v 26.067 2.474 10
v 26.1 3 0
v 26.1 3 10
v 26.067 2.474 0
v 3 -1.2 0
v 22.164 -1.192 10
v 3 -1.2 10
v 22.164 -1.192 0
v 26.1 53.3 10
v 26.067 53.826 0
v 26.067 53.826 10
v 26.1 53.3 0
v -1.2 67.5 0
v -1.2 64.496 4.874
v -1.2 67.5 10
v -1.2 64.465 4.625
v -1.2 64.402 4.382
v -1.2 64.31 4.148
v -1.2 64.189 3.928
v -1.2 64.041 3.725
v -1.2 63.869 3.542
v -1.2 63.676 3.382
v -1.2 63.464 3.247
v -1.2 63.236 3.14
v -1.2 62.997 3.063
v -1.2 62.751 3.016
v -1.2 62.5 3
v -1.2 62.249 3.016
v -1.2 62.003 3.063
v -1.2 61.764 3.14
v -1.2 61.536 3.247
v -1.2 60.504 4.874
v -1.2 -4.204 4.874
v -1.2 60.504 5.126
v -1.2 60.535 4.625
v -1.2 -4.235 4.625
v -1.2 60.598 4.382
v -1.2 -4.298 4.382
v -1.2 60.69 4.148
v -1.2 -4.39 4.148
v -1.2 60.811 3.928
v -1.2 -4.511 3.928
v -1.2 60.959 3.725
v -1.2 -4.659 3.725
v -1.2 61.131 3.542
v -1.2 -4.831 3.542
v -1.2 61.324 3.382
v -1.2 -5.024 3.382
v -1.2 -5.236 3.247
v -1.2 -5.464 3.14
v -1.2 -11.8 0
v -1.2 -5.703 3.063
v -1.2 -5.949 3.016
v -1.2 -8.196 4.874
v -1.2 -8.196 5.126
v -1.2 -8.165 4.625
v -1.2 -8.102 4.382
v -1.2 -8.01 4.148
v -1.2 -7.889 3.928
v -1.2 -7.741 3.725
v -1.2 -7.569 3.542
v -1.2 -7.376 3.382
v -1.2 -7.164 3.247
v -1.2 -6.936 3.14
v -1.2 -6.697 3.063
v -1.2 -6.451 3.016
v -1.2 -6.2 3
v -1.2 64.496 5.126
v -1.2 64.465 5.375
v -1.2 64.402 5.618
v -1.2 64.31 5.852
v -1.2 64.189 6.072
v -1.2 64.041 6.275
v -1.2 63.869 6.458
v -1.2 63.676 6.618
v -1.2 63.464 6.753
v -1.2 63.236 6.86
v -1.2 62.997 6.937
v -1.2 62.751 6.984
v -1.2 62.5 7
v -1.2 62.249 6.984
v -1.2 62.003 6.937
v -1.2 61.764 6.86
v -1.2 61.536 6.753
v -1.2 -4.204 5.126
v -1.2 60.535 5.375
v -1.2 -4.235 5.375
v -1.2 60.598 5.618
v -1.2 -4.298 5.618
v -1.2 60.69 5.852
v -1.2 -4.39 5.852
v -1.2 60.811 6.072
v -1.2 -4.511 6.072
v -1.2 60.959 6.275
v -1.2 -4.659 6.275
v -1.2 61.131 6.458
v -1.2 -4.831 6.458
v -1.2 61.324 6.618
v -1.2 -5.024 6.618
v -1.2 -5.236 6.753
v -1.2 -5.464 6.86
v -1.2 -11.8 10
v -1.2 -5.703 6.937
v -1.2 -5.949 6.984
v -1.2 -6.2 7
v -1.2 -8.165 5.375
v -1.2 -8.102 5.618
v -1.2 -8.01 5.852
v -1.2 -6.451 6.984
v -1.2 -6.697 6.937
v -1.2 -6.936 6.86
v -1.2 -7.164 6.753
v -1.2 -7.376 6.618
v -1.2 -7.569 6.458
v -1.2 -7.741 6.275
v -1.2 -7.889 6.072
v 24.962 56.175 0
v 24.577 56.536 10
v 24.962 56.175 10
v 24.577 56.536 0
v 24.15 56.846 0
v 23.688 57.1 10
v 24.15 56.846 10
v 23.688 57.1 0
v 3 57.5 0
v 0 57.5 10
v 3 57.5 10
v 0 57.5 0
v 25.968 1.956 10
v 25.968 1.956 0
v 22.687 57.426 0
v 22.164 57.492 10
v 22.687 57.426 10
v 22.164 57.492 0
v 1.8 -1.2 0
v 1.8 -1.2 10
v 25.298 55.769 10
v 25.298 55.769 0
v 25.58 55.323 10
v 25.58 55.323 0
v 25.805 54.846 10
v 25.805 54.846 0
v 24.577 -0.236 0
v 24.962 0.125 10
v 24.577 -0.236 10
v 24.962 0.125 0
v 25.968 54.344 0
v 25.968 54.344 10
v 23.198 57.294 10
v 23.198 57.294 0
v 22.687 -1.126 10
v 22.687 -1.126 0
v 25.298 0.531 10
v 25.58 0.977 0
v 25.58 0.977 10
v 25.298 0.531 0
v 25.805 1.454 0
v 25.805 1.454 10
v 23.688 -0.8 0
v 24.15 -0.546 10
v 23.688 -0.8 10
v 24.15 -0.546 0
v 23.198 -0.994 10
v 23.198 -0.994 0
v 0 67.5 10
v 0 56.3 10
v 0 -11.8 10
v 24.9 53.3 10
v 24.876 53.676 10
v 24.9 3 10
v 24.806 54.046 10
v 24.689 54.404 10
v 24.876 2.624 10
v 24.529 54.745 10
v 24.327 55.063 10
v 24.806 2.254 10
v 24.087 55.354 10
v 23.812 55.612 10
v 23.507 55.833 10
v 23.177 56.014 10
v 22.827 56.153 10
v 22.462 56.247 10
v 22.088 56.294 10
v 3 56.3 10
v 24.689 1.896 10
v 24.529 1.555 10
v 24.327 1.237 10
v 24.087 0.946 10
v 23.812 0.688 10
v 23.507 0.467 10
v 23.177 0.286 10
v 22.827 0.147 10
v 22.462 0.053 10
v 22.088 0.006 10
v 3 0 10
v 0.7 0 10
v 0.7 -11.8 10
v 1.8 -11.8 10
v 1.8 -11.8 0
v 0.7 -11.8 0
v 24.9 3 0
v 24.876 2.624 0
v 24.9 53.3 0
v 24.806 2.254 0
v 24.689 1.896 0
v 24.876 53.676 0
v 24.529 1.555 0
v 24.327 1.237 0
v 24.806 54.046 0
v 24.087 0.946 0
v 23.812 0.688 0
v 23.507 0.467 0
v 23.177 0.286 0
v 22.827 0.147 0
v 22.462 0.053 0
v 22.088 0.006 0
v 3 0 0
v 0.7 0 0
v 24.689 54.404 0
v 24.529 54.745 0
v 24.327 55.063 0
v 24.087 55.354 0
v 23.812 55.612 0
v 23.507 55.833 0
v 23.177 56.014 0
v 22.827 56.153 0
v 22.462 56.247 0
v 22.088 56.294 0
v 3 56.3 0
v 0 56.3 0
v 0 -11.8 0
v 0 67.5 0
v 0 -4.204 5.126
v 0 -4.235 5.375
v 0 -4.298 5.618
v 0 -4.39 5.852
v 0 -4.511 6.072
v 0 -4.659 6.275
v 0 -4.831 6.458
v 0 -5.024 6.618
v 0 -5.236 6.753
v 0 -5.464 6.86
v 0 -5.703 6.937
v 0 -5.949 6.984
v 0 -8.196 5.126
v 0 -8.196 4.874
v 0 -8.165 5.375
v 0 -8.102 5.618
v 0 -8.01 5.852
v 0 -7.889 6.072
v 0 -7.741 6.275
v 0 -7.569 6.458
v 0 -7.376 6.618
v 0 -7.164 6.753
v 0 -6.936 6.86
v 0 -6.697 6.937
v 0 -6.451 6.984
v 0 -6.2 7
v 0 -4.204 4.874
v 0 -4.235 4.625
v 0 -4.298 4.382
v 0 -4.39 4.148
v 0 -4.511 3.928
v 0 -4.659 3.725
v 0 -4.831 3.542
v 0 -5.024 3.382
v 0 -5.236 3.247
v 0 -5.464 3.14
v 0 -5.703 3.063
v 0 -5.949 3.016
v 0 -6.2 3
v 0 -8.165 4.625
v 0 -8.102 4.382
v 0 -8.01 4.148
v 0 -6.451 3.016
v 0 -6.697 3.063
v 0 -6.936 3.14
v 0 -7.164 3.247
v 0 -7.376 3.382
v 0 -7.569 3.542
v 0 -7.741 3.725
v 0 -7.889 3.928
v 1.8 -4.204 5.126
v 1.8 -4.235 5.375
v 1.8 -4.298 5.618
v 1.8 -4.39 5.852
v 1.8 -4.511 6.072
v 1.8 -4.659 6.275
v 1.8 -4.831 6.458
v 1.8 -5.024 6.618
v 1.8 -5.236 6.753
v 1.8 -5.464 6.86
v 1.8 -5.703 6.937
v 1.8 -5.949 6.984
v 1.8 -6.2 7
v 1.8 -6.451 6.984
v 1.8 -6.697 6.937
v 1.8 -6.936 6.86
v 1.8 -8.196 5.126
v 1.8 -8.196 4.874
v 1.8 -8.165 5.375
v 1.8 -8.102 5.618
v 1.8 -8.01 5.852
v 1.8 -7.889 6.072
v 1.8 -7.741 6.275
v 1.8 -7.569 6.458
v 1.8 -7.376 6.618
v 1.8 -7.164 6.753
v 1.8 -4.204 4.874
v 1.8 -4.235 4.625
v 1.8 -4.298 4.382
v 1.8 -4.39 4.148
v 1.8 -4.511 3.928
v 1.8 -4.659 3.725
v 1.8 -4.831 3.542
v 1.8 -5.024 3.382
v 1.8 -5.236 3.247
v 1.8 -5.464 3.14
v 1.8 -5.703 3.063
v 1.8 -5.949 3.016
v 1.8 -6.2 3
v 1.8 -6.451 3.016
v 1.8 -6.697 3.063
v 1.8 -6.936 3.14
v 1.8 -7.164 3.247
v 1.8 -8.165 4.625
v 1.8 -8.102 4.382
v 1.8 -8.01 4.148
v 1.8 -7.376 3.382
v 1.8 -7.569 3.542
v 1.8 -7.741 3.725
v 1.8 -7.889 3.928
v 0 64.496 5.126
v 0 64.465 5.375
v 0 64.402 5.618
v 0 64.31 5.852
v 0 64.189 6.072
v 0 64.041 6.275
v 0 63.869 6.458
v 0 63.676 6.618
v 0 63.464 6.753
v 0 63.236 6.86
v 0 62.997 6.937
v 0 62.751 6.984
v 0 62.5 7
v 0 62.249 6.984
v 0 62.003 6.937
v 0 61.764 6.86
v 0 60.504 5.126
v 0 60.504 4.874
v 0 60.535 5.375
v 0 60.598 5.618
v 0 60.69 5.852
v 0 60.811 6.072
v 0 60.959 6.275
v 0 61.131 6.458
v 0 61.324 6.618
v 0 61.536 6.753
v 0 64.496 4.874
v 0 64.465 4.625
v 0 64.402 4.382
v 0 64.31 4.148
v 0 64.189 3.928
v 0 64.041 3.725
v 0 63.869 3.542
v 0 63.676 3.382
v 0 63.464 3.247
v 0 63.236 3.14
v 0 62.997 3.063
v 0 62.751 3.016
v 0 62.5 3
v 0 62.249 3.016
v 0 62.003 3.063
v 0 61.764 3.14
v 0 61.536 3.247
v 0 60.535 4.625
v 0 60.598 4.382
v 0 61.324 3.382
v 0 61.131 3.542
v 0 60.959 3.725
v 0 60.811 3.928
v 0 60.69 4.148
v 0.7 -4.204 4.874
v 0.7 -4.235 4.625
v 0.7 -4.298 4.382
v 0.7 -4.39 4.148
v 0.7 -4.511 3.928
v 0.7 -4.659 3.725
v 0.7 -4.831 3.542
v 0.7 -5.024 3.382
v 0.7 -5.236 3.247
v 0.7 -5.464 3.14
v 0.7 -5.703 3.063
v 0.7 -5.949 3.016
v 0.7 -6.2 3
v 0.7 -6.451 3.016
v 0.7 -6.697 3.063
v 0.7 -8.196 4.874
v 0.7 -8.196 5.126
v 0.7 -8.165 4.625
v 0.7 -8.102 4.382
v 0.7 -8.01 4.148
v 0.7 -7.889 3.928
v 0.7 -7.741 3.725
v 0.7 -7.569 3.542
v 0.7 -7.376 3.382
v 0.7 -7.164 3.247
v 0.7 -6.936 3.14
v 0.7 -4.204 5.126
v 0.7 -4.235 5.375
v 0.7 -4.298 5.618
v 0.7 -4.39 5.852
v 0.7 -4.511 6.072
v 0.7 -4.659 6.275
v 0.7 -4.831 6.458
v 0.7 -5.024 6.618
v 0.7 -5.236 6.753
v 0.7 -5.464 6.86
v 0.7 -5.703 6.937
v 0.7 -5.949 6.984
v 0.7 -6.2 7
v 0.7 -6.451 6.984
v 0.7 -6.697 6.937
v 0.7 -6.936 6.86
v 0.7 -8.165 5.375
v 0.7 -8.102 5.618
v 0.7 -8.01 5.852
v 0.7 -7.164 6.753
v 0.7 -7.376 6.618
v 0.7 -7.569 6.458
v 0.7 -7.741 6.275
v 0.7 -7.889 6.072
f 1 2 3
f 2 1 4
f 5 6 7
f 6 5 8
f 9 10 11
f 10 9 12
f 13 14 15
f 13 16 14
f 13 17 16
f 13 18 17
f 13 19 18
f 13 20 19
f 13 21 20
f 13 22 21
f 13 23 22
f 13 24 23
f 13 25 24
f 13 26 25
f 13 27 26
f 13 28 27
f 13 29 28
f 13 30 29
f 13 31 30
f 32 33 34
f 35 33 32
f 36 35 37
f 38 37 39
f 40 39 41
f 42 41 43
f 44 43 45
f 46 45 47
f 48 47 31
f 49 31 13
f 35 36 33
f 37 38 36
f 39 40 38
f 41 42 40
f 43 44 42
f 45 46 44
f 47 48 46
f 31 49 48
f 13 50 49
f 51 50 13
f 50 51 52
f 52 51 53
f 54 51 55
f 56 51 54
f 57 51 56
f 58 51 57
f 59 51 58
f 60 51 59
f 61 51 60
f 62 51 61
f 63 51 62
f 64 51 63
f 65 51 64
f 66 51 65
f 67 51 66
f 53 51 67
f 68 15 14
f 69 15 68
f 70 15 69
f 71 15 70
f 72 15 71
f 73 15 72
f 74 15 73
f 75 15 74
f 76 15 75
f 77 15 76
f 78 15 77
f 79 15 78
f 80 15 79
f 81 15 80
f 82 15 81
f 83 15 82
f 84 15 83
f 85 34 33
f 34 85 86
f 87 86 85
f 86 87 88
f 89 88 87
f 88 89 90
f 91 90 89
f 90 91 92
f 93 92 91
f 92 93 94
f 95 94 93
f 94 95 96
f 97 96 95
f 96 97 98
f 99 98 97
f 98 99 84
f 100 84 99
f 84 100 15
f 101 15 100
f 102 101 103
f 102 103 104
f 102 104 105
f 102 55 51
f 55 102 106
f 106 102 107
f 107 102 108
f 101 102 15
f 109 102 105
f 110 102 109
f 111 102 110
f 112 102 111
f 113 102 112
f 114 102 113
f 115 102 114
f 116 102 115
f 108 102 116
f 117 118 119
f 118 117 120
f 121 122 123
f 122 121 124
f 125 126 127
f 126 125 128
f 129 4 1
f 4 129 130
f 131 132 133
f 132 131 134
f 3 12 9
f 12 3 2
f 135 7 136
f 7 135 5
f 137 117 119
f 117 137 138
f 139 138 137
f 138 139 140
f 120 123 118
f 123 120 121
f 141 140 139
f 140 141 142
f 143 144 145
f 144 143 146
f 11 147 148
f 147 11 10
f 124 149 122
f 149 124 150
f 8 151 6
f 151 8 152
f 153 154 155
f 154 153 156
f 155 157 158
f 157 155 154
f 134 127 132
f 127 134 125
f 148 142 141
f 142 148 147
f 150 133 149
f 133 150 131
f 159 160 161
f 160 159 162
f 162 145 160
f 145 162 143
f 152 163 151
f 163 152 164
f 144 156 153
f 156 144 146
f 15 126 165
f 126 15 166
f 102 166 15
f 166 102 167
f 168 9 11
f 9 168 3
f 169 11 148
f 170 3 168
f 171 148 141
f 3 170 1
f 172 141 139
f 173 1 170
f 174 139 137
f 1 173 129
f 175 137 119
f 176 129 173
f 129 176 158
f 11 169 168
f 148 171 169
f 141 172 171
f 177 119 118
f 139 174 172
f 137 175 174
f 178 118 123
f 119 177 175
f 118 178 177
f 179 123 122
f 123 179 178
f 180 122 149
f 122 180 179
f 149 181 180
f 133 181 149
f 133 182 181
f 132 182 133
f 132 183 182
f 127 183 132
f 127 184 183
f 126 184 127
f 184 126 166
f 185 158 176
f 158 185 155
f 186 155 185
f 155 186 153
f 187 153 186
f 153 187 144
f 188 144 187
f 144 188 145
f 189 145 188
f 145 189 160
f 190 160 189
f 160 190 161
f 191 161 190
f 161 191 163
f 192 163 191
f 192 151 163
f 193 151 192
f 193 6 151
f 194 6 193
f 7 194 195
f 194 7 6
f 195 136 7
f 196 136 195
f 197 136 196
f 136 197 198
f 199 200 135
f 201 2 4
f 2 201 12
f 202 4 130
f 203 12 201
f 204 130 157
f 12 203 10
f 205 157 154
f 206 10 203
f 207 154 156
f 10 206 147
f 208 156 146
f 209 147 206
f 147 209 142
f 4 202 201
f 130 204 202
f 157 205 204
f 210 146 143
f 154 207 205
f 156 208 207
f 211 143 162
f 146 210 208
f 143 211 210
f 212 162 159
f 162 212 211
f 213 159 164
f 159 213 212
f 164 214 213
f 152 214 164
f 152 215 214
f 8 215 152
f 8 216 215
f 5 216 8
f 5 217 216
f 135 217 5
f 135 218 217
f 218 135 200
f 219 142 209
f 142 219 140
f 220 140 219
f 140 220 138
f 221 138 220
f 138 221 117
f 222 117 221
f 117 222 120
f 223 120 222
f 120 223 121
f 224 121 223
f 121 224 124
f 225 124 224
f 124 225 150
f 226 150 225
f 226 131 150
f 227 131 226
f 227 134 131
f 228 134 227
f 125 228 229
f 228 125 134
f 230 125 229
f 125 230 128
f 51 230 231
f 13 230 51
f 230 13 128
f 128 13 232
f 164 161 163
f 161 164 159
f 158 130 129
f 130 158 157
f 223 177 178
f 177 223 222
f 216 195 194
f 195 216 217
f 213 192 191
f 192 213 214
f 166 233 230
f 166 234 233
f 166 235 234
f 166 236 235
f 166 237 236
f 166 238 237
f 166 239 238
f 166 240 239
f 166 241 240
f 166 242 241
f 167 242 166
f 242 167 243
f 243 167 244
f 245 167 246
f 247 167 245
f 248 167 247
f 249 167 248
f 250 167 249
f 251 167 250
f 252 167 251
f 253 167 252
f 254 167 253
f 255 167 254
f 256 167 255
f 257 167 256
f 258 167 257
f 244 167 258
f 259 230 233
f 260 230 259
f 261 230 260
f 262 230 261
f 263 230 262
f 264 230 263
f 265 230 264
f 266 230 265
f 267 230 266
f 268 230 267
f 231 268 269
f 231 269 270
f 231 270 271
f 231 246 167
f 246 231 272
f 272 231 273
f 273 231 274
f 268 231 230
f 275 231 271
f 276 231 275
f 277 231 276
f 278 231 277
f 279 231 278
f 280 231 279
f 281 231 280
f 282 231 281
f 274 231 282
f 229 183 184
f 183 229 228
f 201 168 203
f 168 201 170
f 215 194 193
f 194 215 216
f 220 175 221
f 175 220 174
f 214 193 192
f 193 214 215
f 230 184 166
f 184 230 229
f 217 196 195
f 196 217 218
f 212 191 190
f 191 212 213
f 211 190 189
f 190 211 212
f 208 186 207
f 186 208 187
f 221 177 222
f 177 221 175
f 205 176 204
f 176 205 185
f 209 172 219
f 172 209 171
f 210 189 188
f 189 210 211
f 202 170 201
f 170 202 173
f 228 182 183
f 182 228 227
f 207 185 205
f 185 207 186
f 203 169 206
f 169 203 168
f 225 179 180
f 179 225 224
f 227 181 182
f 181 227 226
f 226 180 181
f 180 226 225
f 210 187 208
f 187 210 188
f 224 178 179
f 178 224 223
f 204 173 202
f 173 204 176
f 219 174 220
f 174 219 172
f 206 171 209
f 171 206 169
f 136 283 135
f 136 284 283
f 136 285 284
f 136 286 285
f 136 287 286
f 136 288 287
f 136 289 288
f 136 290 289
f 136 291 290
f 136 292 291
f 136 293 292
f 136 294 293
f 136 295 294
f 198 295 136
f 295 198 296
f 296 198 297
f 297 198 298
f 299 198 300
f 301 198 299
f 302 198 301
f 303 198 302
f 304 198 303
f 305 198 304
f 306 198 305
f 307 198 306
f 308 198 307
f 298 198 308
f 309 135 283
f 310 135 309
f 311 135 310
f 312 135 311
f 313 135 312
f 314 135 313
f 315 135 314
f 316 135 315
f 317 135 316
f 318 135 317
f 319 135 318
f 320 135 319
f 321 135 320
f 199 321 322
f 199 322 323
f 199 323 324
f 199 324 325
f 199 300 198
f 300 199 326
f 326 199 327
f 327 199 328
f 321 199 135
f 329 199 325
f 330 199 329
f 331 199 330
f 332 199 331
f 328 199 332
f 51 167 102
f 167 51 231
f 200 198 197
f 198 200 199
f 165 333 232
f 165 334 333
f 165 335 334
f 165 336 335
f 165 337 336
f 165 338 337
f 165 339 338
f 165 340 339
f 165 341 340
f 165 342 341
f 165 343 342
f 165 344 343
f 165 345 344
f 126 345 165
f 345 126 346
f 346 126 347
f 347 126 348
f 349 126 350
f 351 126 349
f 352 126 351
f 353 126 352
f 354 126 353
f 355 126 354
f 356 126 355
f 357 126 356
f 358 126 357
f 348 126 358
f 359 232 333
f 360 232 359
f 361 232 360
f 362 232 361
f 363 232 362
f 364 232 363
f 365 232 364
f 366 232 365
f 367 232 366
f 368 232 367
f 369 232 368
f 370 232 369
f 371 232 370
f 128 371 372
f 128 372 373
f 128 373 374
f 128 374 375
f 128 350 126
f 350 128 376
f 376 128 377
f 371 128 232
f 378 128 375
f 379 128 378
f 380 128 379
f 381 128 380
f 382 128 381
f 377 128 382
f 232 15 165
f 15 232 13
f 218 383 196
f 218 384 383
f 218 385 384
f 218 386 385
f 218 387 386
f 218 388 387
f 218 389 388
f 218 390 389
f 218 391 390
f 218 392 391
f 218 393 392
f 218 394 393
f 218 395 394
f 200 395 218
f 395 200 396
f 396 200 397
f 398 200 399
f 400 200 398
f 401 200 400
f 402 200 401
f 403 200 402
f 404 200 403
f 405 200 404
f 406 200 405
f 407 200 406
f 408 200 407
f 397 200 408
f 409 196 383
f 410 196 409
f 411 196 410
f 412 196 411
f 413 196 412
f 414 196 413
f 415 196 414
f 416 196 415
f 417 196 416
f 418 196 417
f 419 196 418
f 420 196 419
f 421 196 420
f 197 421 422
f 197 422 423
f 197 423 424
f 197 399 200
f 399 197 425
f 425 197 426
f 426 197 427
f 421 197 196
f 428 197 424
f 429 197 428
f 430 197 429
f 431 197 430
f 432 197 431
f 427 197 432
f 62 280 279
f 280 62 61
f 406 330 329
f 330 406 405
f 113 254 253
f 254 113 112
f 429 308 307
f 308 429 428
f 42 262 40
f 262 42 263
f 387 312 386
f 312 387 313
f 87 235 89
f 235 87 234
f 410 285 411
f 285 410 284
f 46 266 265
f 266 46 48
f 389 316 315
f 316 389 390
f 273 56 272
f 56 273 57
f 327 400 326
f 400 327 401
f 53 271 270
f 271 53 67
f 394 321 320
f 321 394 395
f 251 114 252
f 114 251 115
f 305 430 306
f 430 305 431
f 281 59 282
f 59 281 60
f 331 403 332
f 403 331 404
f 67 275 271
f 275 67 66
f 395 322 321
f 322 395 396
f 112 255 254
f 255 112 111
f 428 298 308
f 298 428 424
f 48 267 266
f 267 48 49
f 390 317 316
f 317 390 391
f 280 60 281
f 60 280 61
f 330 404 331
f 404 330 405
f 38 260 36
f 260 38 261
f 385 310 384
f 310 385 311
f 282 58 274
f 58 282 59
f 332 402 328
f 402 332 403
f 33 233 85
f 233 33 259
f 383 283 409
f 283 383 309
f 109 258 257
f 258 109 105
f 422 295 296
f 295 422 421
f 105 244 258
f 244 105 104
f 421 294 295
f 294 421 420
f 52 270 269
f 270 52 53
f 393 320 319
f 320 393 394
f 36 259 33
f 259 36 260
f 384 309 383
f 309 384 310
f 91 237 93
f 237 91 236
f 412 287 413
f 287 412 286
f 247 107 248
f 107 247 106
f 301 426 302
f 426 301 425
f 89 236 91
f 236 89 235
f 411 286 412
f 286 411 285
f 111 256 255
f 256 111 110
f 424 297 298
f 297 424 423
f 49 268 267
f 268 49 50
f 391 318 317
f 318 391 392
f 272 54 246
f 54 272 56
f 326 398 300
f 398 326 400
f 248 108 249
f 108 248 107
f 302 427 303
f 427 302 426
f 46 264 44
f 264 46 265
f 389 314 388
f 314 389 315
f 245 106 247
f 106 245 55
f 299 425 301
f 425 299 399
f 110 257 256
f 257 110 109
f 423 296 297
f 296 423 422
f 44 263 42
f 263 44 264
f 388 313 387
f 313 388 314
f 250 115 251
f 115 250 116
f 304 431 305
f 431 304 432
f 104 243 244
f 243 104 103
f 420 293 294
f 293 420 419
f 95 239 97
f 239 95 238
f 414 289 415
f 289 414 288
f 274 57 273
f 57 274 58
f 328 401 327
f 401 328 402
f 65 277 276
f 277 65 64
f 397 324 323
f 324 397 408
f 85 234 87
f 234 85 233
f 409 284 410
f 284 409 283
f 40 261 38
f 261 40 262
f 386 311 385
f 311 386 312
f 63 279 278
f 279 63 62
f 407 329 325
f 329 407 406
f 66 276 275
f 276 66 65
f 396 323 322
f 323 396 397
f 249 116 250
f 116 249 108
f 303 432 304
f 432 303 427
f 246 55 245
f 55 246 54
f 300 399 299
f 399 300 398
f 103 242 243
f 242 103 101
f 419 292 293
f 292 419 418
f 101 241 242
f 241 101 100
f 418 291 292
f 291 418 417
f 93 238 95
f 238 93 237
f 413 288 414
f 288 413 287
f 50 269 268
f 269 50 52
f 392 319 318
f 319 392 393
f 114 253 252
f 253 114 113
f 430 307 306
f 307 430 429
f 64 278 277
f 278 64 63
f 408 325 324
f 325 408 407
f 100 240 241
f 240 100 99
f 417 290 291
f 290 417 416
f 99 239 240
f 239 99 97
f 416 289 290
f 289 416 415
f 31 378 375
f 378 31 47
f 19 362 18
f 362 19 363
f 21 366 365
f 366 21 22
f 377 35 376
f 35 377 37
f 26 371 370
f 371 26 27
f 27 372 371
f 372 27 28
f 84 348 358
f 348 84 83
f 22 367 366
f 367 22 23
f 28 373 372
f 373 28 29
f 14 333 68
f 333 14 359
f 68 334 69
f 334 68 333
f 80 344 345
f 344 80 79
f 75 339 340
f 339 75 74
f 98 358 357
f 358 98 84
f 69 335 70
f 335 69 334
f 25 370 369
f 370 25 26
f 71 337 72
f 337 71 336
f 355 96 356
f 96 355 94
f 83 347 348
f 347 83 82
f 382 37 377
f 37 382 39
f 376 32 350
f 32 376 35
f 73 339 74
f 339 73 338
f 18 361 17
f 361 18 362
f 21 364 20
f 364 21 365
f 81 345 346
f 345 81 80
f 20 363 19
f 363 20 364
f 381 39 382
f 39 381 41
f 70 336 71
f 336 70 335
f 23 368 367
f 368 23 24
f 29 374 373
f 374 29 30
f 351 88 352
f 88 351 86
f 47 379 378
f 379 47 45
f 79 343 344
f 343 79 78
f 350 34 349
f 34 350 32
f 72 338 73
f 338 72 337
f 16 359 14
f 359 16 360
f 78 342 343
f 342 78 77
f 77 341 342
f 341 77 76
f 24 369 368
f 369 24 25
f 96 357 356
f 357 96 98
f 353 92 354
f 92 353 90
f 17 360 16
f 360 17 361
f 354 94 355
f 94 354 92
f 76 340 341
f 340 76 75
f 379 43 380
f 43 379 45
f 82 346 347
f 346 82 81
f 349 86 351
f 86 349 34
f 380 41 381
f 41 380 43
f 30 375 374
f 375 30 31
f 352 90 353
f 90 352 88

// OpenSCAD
// dimensions of Raspberry Pi 4 w/ Armor case
charger_h = 24.7;
charger_w = 56.1;
charger_l = 90;
charger_chamfer_r = 3;

wall_thickness = 3 * 0.4;

$fn=50;

// charger debug box
// #translate([0,0,0.1]) cube([charger_h, charger_w, charger_l]);

// bracket
bracket_w = 0.2 + charger_h;
bracket_l = 0.2 + charger_w;
bracket_h = 10;
difference() {
  union() {
    difference() {
      translate([-wall_thickness, -wall_thickness, 0])
        rounded_box(bracket_w + 2*wall_thickness, bracket_l + 2*wall_thickness, bracket_h, charger_chamfer_r + wall_thickness);
      translate([0,0,-bracket_h])
        rounded_box(bracket_w, bracket_l, 3*bracket_h, charger_chamfer_r);
    }

    translate([-wall_thickness, -bracket_h-1.5*wall_thickness, 0])
      cube([2.5*wall_thickness, bracket_h+wall_thickness, bracket_h]);

    translate([-wall_thickness, bracket_l, 0])
      cube([wall_thickness, bracket_h+wall_thickness, bracket_h]);
  }

  // thin slice
  translate([0, -2*bracket_h, -bracket_h])
    cube([0.7, 3*bracket_h, 3*bracket_h]);

  // screw holes
  translate([0, -wall_thickness-bracket_h/2, bracket_h/2])
  rotate([0, 90, 0])
    cylinder(d = 4, h = 5*wall_thickness, center = true);

  translate([0, bracket_l+wall_thickness+bracket_h/2, bracket_h/2])
  rotate([0, 90, 0])
    cylinder(d = 4, h = 5*wall_thickness, center = true);
}

module rounded_box(w, l, h, r) {
  hull() {
    cube([r,r,h]);
    translate([0, l-r, 0]) cube([r,r,h]);
    // translate([r,   l-r, 0]) cylinder(r = r, h = h);
    translate([w-r, l-r, 0]) cylinder(r = r, h = h);
    translate([w-r, r,   0]) cylinder(r = r, h = h);
  }
}
